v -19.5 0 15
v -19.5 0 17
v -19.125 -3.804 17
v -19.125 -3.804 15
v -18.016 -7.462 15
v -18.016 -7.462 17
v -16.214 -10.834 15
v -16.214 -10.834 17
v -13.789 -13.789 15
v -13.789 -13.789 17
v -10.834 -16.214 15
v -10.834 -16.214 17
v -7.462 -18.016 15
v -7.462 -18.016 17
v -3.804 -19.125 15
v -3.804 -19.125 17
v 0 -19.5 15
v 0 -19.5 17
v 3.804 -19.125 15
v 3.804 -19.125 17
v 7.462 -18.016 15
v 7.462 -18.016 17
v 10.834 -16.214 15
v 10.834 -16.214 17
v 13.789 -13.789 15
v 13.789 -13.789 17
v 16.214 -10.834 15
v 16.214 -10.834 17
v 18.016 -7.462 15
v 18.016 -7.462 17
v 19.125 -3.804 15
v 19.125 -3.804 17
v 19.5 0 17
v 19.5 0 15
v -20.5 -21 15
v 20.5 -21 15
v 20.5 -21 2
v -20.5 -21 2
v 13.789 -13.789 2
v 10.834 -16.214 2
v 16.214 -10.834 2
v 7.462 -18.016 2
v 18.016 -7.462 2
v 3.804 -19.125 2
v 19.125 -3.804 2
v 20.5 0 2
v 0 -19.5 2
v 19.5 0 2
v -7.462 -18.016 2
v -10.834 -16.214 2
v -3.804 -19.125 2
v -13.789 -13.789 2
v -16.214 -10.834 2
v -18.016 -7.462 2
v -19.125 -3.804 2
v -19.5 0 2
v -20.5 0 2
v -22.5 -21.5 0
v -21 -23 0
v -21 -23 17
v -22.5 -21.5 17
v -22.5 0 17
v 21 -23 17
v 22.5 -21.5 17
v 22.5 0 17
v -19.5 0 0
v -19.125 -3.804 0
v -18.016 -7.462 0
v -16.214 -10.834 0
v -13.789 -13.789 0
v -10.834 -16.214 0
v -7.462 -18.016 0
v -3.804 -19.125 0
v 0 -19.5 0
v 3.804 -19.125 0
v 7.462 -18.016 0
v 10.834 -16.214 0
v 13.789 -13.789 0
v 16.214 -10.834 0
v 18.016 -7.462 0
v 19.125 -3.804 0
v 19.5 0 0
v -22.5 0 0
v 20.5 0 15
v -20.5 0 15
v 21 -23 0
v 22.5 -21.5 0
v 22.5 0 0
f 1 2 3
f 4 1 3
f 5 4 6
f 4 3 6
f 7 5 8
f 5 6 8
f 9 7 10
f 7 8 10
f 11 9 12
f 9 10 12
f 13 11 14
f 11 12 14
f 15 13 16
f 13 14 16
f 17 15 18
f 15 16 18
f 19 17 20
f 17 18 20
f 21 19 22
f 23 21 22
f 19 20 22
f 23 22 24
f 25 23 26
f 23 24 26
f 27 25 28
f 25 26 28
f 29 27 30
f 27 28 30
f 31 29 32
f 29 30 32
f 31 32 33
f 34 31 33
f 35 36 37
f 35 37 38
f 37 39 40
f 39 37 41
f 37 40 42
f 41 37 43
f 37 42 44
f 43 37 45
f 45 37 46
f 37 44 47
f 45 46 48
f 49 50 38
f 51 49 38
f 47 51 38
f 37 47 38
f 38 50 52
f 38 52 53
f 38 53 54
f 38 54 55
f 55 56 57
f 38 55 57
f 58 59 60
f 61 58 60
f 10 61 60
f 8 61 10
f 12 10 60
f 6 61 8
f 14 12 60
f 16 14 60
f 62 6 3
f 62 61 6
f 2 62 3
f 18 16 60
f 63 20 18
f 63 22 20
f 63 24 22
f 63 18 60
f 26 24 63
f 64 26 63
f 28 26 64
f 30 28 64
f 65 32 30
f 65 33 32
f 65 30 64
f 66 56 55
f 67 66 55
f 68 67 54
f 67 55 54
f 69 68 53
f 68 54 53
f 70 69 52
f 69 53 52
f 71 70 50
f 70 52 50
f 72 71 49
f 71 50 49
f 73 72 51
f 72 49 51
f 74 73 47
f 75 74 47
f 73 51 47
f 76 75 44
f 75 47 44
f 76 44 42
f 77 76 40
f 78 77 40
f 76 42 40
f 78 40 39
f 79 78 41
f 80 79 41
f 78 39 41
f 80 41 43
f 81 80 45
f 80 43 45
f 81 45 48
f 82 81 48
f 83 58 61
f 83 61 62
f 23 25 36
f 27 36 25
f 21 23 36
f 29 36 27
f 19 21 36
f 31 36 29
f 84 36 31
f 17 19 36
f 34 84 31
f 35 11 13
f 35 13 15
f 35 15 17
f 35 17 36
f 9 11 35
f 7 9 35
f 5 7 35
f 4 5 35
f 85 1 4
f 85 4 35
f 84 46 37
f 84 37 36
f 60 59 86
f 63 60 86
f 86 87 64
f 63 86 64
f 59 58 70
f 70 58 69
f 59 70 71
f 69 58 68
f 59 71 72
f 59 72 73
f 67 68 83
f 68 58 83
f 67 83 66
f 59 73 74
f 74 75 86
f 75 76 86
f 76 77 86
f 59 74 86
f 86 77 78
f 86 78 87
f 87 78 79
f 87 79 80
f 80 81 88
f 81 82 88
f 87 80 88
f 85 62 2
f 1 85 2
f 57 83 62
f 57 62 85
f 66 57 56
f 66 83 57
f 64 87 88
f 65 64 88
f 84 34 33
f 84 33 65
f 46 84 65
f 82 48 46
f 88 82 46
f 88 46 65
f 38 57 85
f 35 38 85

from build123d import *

# Parameters (mm, degrees)
SKETCH001_W     = 45
SKETCH001_H     = 23
PAD001_DEPTH    = 17
SKETCH002_W     = 41
SKETCH002_H     = 13
POCKET_DEPTH    = 21
SKETCH003_R     = 19.5
POCKET001_DEPTH = 17.001
CHAMFER_SIZE    = 1.5


with BuildPart() as part:
    # Sketch001 → Pad001 (new body)
    with BuildSketch(Plane.XY):
        with Locations((0, -11.5)):
            Rectangle(SKETCH001_W, SKETCH001_H)
    extrude(amount=PAD001_DEPTH)

    # Sketch002 (on Face1 of Pad001) → Pocket (cut)
    with BuildSketch(Plane(origin=(0, 0, 0), x_dir=(-1, 0, 0), z_dir=(0, 1, 0))):
        with Locations((0, 8.5)):
            Rectangle(SKETCH002_W, SKETCH002_H)
    extrude(amount=-POCKET_DEPTH, mode=Mode.SUBTRACT)

    # Sketch003 (on Face4 of Pocket) → Pocket001 (cut, through all)
    with BuildSketch(Plane.XY.offset(17)):
        Circle(SKETCH003_R)
    extrude(amount=-POCKET001_DEPTH, mode=Mode.SUBTRACT)

    # Chamfer
    chamfer_edges = [part.edges().sort_by_distance(p)[0] for p in [
        (-22.5, -23, 8.5),
        (22.5, -23, 8.5),
    ]]
    chamfer(chamfer_edges, length=CHAMFER_SIZE)


solid = part.part
